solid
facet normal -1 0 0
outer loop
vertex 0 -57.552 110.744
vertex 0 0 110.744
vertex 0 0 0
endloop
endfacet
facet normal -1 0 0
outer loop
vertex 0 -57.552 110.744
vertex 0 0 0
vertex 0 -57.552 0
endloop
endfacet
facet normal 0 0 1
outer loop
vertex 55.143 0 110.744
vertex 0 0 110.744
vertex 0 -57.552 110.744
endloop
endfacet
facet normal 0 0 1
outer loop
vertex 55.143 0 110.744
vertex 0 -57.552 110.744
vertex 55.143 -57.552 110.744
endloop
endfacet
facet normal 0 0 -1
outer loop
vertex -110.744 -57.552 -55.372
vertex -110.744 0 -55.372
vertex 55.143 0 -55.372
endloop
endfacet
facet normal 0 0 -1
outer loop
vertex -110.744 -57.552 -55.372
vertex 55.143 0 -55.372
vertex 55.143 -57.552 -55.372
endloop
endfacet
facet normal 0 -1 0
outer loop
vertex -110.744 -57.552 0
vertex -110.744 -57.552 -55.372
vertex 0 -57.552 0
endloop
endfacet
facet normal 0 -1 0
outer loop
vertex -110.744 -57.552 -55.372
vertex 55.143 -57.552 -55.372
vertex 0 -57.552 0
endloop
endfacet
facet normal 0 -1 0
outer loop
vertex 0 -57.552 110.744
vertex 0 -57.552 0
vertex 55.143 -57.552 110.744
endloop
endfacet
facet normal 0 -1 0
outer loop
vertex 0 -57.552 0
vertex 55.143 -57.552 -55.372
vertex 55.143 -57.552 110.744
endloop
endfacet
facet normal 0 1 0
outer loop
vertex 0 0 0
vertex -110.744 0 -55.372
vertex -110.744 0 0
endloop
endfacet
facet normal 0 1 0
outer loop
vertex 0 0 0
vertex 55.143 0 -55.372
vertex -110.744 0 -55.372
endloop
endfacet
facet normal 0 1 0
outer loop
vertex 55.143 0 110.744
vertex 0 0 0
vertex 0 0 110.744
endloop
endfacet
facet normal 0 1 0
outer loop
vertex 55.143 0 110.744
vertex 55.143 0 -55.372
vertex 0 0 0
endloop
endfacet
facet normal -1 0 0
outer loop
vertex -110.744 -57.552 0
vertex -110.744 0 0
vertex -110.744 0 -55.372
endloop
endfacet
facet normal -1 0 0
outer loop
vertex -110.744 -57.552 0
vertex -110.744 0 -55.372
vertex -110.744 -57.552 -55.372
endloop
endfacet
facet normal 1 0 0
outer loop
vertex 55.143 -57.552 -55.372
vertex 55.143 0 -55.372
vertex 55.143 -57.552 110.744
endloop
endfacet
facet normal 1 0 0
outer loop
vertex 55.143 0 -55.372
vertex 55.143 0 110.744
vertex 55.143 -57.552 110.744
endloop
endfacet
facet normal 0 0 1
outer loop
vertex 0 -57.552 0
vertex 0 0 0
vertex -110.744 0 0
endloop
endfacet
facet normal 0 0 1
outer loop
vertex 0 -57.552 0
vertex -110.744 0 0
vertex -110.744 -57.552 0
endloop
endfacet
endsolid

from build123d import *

# Parameters (mm, degrees)
F0_W     = 55.142552
F0_H     = 57.551987
F1_DEPTH = 55.372
F2_W     = 55.142552
F2_H     = 57.551987
F3_DEPTH = 55.372
F4_W     = 55.142552
F4_H     = 57.551987
F5_DEPTH = 55.372
F6_W     = 57.551987
F6_H     = 55.372
F7_DEPTH = 55.372
F8_W     = 57.551987
F8_H     = 55.372
F9_DEPTH = 55.372


with BuildPart() as f1:
    # F0 (on Top) → F1 (new body)
    with BuildSketch(Plane.XY):
        with Locations((27.571276, -28.775993)):
            Rectangle(F0_W, F0_H)
    extrude(amount=F1_DEPTH)

    # F2 (on face) → F3 (join)
    with BuildSketch(Plane.XY.offset(55.372)):
        with Locations((27.571276, -28.775993)):
            Rectangle(F2_W, F2_H)
    extrude(amount=F3_DEPTH)

    # F4 (on face) → F5 (join)
    with BuildSketch(Plane(origin=(0, 0, 0), x_dir=(1, 0, 0), z_dir=(0, 0, -1))):
        with Locations((27.571276, 28.775993)):
            Rectangle(F4_W, F4_H)
    extrude(amount=F5_DEPTH)

    # F6 (on face) → F7 (join)
    with BuildSketch(Plane(origin=(0, 0, 0), x_dir=(0, -1, 0), z_dir=(-1, 0, 0))):
        with Locations((28.775993, -27.686)):
            Rectangle(F6_W, F6_H)
    extrude(amount=F7_DEPTH)

    # F8 (on face) → F9 (join)
    with BuildSketch(Plane(origin=(-55.372, 0, 0), x_dir=(0, -1, 0), z_dir=(-1, 0, 0))):
        with Locations((28.775993, -27.686)):
            Rectangle(F8_W, F8_H)
    extrude(amount=F9_DEPTH)


solid = f1.part
